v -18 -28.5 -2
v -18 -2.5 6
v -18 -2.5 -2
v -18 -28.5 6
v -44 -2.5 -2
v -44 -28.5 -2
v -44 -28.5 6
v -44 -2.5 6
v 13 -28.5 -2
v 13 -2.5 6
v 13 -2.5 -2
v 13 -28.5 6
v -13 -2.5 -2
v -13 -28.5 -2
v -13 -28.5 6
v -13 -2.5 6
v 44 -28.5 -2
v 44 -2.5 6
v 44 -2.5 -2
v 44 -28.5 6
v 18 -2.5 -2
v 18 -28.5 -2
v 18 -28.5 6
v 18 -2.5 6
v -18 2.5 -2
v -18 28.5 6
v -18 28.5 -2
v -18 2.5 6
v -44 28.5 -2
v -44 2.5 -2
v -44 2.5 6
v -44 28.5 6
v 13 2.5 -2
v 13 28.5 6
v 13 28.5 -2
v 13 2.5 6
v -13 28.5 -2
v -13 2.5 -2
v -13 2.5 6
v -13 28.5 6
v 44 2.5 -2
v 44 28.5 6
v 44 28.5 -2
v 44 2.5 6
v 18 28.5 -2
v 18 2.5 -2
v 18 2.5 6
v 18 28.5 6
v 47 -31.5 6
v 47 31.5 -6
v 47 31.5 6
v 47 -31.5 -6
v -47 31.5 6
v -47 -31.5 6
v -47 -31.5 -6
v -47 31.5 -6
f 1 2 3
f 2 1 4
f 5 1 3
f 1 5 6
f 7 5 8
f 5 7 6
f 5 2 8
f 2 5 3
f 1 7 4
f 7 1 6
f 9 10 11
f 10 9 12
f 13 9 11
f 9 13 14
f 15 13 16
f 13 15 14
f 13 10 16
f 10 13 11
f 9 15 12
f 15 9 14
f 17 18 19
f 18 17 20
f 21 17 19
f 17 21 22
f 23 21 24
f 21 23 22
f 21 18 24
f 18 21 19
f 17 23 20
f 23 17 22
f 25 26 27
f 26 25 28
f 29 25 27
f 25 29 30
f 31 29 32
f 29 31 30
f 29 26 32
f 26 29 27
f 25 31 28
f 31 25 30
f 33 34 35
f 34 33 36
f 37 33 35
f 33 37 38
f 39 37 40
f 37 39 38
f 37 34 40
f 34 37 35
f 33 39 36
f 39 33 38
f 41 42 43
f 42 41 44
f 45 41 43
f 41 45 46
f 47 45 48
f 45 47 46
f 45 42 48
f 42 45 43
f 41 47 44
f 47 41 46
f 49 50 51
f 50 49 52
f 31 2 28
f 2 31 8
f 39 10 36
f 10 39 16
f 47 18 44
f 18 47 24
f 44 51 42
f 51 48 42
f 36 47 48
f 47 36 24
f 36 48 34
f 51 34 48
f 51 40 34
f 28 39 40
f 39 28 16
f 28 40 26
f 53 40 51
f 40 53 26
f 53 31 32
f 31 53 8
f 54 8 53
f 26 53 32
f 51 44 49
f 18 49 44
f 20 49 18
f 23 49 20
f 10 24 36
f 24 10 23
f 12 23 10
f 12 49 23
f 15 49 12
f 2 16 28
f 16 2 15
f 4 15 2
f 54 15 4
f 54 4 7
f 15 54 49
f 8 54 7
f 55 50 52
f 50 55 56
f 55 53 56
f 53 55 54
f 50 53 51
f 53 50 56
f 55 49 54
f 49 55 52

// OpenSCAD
$fn = 32;

// ----------------------------------------------------------------------
// Pocket plate 94 x 63 x 12
// 2 x 3 pockets 26 mm square, 8 mm deep
// ----------------------------------------------------------------------

// --- parameters (mm) ---
thickness = 12;  // plate thickness
floor_t = 4;     // material left under each pocket
pocket = 26;     // pocket side length
pitch_x = 31;    // pocket pitch along X
pitch_y = 31;    // pocket pitch along Y
cols = 3;        // pockets per row
rows = 2;        // rows of pockets

// --- derived feature positions (mm) ---
depth = thickness - floor_t;        // = 8   pocket depth, down to the floor
span_x = (cols - 1) * pitch_x;      // = 62   distance between outer pockets
span_y = (rows - 1) * pitch_y;      // = 31   distance between outer pocket rows
origin_x = -span_x / 2;             // = -31   X of the first pocket
origin_y = -span_y / 2;             // = -15.5   Y of the first pocket
plate = [span_x + pocket + 6, span_y + pocket + 6, thickness];  // = [94, 63, 12]   overall size: pockets plus 3 mm of wall on each side
feature_centers = [
  [origin_x + 0 * pitch_x, origin_y + 0 * pitch_y],
  [origin_x + 1 * pitch_x, origin_y + 0 * pitch_y],
  [origin_x + 2 * pitch_x, origin_y + 0 * pitch_y],
  [origin_x + 0 * pitch_x, origin_y + 1 * pitch_y],
  [origin_x + 1 * pitch_x, origin_y + 1 * pitch_y],
  [origin_x + 2 * pitch_x, origin_y + 1 * pitch_y]
];   // pocket centres, used verbatim by the cutter loop

// plate outline, then one pocket per centre in feature_centers
difference() {
  cube(plate, center = true);
  for (centre = feature_centers)
    translate([centre[0] - pocket / 2, centre[1] - pocket / 2, plate[2] / 2 - depth])
      cube([pocket, pocket, depth + 1]);  // centred on the declared pocket centre
}
